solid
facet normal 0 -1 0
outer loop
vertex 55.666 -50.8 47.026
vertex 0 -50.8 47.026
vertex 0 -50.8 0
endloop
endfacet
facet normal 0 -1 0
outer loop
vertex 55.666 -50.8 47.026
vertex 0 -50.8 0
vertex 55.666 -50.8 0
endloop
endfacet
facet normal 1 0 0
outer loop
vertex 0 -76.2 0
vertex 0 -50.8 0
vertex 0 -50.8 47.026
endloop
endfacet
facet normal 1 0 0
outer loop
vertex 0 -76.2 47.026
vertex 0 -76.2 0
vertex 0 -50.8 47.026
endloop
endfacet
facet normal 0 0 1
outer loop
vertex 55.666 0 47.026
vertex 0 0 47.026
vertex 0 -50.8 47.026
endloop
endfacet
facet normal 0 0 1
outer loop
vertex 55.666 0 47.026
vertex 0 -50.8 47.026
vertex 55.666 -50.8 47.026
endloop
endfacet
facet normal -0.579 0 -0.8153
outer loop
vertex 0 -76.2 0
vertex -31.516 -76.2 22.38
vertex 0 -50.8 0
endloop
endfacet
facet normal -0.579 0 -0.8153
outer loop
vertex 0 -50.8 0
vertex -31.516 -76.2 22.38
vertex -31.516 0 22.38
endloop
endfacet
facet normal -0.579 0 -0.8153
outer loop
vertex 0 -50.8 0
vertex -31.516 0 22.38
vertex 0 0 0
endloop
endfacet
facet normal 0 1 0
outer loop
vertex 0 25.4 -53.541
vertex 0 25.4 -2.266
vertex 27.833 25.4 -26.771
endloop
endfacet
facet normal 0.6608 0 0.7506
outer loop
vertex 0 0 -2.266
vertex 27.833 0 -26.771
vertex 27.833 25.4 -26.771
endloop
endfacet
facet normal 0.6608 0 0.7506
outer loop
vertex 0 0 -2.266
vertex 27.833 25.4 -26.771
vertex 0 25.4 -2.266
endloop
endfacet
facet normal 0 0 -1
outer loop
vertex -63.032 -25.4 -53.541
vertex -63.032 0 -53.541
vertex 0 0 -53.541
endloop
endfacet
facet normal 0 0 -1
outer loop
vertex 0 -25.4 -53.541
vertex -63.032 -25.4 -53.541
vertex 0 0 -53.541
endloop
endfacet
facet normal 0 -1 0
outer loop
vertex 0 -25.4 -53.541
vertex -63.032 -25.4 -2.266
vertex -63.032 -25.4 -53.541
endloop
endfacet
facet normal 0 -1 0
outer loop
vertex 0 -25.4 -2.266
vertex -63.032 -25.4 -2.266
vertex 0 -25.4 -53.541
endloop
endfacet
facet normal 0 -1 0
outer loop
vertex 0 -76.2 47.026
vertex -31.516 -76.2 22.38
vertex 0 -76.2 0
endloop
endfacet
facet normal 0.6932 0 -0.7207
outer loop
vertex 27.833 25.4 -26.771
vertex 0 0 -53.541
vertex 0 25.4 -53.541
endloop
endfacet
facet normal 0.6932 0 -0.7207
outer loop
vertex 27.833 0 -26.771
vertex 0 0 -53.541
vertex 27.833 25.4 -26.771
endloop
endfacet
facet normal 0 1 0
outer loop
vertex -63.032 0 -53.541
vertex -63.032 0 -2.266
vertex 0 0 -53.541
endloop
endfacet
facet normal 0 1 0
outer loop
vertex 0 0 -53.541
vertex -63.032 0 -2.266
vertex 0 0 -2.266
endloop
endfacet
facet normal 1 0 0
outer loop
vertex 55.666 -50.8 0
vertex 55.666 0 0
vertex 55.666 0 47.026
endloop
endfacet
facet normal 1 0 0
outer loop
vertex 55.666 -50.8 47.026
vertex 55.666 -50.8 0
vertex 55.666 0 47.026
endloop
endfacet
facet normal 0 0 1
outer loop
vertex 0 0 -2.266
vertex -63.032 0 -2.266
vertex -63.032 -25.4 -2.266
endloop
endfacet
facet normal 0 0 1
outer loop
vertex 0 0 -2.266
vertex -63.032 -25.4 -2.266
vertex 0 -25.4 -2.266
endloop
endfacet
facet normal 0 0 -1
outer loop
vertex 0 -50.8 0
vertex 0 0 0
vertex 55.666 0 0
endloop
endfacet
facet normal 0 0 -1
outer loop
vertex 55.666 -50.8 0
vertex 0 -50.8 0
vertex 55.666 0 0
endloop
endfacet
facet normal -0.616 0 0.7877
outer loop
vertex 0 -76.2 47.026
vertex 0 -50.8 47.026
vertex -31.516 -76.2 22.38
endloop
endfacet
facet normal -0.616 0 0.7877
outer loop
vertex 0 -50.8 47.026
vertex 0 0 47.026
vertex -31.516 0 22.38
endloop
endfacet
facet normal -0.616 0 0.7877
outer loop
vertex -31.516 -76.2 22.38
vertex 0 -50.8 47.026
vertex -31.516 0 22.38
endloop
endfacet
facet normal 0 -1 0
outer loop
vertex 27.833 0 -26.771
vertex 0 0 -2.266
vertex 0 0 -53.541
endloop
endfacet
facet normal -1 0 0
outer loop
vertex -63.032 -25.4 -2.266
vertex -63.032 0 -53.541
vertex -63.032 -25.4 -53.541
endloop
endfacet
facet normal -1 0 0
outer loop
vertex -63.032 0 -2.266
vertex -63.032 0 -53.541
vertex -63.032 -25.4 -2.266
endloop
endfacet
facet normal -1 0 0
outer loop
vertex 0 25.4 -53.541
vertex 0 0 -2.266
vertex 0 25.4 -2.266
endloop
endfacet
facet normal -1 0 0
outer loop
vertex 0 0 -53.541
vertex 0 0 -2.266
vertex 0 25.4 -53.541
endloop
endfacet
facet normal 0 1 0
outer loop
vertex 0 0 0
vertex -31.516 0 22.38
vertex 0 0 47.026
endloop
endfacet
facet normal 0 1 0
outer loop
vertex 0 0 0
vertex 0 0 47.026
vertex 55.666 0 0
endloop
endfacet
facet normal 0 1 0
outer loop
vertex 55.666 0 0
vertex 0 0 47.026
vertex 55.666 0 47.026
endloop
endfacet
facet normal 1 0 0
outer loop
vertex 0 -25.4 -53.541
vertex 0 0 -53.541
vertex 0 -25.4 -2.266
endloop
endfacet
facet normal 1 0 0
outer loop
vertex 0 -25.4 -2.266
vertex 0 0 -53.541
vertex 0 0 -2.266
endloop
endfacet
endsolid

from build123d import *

# Parameters (mm, degrees)
F0_W     = 63.031606
F0_H     = 51.275146
F1_DEPTH = 25.4
F0_W_2   = 55.666108
F0_H_2   = 47.025826
F2_DEPTH = 50.8
F3_DEPTH = 76.2
F4_DEPTH = 25.4


with BuildPart() as f1:
    # F0 (on Front) → F1 (new body)
    with BuildSketch(Plane.XZ):
        with Locations((-31.515803, -27.903875)):
            Rectangle(F0_W, F0_H)
    extrude(amount=F1_DEPTH)

    # F0 (on Front) → F4 (join)
    with BuildSketch(Plane.XZ):
        Polygon((0, -53.541448), (27.833054, -26.770724), (0, -2.266302), align=None)
    extrude(amount=-F4_DEPTH)


with BuildPart() as f2:
    # F0 (on Front) → F2 (new body)
    with BuildSketch(Plane.XZ):
        with Locations((27.833054, 23.512913)):
            Rectangle(F0_W_2, F0_H_2)
    extrude(amount=F2_DEPTH)

    # F0 (on Front) → F3 (join)
    with BuildSketch(Plane.XZ):
        Polygon((-31.515803, 22.379762), (0, 0), (0, 47.025826), align=None)
    extrude(amount=F3_DEPTH)


solid = Compound([f1.part, f2.part])
